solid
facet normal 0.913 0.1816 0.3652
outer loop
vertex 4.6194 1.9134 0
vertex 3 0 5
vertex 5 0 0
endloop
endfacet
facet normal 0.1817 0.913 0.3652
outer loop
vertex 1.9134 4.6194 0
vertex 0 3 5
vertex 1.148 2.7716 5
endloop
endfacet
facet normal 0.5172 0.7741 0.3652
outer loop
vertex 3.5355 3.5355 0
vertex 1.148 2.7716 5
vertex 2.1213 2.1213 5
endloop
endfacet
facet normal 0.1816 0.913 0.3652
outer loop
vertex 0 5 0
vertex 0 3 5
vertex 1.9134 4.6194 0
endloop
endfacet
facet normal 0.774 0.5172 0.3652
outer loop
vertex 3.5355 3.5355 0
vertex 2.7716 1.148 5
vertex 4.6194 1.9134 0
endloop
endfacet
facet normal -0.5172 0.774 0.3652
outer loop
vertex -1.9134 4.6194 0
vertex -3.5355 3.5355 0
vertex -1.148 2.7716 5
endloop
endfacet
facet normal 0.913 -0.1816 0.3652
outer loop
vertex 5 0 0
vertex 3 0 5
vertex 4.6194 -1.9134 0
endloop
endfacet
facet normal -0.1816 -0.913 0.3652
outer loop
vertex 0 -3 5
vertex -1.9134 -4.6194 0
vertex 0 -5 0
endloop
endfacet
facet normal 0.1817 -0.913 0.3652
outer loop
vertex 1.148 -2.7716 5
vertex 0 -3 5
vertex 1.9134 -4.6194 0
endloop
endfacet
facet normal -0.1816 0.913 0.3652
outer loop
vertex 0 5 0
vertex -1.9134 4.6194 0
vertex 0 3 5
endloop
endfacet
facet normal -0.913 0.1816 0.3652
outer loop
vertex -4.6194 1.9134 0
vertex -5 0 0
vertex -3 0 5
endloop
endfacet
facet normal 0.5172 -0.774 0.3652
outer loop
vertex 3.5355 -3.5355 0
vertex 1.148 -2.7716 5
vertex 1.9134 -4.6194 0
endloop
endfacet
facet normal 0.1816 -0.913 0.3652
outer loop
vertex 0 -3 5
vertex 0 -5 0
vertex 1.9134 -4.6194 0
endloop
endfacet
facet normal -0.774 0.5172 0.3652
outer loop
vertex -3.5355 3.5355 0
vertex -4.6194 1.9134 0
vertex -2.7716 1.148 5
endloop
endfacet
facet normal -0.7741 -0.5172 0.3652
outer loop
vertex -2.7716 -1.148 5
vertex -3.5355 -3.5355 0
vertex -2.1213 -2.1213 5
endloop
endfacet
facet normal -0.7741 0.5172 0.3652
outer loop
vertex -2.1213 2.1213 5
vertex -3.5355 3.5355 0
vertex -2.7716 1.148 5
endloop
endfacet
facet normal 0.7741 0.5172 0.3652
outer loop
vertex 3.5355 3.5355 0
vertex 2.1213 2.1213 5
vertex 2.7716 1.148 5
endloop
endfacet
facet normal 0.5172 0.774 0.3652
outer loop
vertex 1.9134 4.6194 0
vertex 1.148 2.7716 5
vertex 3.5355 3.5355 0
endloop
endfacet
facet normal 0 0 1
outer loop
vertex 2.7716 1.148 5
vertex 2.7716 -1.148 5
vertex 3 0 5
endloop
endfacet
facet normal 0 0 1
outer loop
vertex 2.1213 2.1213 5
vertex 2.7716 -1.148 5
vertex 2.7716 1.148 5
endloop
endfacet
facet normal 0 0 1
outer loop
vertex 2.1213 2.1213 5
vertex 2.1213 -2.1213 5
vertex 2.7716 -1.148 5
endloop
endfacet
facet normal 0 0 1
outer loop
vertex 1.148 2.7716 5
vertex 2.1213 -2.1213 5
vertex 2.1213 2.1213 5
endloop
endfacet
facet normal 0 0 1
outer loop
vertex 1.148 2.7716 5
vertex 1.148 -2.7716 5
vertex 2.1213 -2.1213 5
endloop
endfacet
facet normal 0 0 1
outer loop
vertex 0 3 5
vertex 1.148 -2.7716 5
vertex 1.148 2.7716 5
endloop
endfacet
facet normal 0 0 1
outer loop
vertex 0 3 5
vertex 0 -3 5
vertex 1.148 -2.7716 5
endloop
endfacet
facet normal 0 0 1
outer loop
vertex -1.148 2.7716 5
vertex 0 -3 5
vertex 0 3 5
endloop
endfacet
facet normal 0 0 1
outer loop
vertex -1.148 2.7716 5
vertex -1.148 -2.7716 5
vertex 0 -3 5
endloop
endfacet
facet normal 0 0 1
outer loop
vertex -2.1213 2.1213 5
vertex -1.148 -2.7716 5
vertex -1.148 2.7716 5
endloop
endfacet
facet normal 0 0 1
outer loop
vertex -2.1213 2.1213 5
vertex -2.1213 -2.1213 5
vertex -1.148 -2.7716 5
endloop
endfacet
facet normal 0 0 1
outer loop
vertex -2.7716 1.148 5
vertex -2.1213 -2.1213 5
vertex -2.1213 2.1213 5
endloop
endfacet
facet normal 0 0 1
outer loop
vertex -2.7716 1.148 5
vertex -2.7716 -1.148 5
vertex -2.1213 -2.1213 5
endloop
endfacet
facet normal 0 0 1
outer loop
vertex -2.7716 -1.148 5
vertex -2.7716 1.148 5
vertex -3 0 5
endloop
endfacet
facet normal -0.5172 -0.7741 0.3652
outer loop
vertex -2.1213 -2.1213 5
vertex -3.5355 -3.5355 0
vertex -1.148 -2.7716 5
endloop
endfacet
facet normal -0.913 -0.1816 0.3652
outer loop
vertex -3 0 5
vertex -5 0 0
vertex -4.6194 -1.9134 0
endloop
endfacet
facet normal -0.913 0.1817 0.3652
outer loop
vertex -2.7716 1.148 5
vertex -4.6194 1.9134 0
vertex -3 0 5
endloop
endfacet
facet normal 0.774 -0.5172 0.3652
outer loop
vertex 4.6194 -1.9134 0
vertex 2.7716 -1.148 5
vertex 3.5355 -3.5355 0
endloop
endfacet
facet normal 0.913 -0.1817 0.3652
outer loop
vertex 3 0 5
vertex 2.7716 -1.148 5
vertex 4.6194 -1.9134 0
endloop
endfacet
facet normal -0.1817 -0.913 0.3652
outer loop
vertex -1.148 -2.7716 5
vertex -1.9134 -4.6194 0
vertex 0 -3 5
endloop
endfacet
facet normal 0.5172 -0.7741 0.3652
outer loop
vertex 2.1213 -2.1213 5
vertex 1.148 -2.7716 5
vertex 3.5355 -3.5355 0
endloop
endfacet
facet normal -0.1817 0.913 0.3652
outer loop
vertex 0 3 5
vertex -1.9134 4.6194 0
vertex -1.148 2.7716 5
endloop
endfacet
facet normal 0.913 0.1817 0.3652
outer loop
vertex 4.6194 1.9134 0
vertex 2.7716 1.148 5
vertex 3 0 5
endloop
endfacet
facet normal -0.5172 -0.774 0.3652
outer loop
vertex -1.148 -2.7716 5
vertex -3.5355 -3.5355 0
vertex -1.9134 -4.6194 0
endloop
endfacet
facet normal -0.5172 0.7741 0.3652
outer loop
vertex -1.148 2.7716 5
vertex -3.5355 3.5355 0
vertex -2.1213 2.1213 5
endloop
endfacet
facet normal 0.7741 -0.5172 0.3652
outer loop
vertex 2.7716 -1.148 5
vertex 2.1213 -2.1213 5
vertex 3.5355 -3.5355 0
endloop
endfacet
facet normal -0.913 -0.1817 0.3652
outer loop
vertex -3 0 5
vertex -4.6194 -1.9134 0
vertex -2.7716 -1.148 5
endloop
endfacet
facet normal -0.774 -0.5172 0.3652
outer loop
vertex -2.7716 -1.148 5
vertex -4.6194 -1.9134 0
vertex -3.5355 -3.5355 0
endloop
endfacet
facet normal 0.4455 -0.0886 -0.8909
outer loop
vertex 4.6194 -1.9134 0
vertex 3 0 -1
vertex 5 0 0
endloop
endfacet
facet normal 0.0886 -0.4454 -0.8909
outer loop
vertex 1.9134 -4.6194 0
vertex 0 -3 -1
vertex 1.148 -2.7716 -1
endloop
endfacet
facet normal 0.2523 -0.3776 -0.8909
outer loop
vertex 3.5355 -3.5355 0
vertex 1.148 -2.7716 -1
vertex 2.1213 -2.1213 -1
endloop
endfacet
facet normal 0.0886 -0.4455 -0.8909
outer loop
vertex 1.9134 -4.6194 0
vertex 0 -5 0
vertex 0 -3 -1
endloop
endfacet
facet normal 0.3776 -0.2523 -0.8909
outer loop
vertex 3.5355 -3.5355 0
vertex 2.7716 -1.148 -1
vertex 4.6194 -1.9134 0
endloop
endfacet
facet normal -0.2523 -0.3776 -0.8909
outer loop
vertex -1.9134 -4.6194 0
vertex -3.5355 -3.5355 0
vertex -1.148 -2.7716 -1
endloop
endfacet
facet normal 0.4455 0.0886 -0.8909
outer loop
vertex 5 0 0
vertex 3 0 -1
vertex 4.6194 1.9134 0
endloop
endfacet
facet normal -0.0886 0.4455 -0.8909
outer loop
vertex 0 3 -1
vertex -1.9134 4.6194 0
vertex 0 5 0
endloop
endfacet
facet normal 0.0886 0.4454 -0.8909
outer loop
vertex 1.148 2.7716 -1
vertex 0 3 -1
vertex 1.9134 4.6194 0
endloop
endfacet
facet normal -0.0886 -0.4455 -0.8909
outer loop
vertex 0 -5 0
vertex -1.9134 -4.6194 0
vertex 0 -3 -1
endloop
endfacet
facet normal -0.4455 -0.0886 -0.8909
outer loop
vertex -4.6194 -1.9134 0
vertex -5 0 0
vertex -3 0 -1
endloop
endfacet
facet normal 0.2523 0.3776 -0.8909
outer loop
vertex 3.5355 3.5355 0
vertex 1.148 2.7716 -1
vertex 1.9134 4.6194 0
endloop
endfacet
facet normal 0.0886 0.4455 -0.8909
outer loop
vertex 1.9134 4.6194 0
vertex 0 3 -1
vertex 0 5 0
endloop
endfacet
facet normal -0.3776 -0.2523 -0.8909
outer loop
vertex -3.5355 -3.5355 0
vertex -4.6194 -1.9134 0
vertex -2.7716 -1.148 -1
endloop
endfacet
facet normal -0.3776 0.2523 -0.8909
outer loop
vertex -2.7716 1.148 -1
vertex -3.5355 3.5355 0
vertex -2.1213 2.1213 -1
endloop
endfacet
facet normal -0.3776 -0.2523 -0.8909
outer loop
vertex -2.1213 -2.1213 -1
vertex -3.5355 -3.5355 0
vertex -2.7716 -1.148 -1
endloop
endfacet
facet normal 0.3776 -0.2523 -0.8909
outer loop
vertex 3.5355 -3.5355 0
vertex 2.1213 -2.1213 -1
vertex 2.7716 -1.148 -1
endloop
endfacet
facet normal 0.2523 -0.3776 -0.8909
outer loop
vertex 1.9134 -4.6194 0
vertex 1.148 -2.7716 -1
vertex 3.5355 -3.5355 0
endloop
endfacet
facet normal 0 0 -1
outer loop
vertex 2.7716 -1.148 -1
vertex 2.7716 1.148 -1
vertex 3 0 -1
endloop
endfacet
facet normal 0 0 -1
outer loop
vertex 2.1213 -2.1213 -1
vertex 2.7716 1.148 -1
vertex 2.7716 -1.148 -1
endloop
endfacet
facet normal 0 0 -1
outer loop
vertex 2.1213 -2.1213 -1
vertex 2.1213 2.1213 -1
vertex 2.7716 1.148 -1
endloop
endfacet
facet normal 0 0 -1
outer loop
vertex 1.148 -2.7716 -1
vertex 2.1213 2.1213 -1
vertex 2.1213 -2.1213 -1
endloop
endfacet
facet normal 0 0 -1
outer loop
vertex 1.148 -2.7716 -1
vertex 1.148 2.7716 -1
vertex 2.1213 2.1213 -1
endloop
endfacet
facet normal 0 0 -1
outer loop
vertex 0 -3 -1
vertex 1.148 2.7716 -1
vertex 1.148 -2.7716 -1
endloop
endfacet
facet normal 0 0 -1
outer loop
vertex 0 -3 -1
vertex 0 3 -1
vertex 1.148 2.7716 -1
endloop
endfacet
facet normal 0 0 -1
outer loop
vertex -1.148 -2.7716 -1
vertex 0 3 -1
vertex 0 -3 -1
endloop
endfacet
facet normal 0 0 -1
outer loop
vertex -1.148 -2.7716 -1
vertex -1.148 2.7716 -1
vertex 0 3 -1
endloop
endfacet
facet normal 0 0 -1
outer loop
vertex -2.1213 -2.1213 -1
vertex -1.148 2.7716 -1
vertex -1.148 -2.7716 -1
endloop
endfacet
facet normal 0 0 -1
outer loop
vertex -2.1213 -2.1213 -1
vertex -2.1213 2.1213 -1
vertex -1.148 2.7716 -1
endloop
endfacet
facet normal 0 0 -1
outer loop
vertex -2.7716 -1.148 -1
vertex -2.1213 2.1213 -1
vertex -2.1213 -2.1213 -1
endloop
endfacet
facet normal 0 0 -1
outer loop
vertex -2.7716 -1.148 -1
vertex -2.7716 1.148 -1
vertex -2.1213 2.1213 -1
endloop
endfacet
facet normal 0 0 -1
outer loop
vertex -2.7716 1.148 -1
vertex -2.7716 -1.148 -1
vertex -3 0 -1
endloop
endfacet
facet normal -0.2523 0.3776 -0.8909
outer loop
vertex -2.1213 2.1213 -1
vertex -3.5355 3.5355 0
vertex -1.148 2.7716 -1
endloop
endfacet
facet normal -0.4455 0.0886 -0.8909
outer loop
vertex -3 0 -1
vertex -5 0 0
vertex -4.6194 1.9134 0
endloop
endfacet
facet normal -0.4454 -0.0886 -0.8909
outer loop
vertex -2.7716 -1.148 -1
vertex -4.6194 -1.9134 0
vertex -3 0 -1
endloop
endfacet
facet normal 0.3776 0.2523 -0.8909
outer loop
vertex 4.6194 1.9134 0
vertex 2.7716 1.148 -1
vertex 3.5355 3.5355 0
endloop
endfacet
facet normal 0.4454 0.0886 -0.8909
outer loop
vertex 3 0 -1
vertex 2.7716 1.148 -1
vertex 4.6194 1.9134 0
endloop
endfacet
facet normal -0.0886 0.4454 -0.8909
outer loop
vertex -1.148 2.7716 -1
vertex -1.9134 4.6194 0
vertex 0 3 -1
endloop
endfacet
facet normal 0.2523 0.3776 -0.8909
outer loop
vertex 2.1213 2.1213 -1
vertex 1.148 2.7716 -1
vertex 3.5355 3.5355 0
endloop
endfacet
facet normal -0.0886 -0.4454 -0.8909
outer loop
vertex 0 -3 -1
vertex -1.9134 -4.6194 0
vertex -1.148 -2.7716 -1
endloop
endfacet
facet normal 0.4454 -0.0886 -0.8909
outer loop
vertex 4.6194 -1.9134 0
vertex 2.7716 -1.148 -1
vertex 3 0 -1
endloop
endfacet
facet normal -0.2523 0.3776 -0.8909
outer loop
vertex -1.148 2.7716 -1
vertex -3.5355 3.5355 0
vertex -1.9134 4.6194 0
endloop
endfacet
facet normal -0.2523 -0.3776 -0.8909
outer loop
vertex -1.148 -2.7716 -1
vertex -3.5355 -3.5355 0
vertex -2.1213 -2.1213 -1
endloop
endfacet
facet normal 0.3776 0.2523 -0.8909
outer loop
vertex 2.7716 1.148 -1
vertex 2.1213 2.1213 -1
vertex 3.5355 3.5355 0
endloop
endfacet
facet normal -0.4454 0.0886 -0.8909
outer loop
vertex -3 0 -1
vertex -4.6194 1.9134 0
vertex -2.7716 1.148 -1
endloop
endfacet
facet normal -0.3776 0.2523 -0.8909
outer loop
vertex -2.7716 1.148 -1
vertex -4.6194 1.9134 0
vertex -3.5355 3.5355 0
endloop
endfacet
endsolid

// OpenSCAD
cylinder(r1 = 5, r2 = 3, h = 5);

rotate(a = [ 180, 0, 0])
cylinder(r1 = 5, r2 = 3, h = 5, false);
